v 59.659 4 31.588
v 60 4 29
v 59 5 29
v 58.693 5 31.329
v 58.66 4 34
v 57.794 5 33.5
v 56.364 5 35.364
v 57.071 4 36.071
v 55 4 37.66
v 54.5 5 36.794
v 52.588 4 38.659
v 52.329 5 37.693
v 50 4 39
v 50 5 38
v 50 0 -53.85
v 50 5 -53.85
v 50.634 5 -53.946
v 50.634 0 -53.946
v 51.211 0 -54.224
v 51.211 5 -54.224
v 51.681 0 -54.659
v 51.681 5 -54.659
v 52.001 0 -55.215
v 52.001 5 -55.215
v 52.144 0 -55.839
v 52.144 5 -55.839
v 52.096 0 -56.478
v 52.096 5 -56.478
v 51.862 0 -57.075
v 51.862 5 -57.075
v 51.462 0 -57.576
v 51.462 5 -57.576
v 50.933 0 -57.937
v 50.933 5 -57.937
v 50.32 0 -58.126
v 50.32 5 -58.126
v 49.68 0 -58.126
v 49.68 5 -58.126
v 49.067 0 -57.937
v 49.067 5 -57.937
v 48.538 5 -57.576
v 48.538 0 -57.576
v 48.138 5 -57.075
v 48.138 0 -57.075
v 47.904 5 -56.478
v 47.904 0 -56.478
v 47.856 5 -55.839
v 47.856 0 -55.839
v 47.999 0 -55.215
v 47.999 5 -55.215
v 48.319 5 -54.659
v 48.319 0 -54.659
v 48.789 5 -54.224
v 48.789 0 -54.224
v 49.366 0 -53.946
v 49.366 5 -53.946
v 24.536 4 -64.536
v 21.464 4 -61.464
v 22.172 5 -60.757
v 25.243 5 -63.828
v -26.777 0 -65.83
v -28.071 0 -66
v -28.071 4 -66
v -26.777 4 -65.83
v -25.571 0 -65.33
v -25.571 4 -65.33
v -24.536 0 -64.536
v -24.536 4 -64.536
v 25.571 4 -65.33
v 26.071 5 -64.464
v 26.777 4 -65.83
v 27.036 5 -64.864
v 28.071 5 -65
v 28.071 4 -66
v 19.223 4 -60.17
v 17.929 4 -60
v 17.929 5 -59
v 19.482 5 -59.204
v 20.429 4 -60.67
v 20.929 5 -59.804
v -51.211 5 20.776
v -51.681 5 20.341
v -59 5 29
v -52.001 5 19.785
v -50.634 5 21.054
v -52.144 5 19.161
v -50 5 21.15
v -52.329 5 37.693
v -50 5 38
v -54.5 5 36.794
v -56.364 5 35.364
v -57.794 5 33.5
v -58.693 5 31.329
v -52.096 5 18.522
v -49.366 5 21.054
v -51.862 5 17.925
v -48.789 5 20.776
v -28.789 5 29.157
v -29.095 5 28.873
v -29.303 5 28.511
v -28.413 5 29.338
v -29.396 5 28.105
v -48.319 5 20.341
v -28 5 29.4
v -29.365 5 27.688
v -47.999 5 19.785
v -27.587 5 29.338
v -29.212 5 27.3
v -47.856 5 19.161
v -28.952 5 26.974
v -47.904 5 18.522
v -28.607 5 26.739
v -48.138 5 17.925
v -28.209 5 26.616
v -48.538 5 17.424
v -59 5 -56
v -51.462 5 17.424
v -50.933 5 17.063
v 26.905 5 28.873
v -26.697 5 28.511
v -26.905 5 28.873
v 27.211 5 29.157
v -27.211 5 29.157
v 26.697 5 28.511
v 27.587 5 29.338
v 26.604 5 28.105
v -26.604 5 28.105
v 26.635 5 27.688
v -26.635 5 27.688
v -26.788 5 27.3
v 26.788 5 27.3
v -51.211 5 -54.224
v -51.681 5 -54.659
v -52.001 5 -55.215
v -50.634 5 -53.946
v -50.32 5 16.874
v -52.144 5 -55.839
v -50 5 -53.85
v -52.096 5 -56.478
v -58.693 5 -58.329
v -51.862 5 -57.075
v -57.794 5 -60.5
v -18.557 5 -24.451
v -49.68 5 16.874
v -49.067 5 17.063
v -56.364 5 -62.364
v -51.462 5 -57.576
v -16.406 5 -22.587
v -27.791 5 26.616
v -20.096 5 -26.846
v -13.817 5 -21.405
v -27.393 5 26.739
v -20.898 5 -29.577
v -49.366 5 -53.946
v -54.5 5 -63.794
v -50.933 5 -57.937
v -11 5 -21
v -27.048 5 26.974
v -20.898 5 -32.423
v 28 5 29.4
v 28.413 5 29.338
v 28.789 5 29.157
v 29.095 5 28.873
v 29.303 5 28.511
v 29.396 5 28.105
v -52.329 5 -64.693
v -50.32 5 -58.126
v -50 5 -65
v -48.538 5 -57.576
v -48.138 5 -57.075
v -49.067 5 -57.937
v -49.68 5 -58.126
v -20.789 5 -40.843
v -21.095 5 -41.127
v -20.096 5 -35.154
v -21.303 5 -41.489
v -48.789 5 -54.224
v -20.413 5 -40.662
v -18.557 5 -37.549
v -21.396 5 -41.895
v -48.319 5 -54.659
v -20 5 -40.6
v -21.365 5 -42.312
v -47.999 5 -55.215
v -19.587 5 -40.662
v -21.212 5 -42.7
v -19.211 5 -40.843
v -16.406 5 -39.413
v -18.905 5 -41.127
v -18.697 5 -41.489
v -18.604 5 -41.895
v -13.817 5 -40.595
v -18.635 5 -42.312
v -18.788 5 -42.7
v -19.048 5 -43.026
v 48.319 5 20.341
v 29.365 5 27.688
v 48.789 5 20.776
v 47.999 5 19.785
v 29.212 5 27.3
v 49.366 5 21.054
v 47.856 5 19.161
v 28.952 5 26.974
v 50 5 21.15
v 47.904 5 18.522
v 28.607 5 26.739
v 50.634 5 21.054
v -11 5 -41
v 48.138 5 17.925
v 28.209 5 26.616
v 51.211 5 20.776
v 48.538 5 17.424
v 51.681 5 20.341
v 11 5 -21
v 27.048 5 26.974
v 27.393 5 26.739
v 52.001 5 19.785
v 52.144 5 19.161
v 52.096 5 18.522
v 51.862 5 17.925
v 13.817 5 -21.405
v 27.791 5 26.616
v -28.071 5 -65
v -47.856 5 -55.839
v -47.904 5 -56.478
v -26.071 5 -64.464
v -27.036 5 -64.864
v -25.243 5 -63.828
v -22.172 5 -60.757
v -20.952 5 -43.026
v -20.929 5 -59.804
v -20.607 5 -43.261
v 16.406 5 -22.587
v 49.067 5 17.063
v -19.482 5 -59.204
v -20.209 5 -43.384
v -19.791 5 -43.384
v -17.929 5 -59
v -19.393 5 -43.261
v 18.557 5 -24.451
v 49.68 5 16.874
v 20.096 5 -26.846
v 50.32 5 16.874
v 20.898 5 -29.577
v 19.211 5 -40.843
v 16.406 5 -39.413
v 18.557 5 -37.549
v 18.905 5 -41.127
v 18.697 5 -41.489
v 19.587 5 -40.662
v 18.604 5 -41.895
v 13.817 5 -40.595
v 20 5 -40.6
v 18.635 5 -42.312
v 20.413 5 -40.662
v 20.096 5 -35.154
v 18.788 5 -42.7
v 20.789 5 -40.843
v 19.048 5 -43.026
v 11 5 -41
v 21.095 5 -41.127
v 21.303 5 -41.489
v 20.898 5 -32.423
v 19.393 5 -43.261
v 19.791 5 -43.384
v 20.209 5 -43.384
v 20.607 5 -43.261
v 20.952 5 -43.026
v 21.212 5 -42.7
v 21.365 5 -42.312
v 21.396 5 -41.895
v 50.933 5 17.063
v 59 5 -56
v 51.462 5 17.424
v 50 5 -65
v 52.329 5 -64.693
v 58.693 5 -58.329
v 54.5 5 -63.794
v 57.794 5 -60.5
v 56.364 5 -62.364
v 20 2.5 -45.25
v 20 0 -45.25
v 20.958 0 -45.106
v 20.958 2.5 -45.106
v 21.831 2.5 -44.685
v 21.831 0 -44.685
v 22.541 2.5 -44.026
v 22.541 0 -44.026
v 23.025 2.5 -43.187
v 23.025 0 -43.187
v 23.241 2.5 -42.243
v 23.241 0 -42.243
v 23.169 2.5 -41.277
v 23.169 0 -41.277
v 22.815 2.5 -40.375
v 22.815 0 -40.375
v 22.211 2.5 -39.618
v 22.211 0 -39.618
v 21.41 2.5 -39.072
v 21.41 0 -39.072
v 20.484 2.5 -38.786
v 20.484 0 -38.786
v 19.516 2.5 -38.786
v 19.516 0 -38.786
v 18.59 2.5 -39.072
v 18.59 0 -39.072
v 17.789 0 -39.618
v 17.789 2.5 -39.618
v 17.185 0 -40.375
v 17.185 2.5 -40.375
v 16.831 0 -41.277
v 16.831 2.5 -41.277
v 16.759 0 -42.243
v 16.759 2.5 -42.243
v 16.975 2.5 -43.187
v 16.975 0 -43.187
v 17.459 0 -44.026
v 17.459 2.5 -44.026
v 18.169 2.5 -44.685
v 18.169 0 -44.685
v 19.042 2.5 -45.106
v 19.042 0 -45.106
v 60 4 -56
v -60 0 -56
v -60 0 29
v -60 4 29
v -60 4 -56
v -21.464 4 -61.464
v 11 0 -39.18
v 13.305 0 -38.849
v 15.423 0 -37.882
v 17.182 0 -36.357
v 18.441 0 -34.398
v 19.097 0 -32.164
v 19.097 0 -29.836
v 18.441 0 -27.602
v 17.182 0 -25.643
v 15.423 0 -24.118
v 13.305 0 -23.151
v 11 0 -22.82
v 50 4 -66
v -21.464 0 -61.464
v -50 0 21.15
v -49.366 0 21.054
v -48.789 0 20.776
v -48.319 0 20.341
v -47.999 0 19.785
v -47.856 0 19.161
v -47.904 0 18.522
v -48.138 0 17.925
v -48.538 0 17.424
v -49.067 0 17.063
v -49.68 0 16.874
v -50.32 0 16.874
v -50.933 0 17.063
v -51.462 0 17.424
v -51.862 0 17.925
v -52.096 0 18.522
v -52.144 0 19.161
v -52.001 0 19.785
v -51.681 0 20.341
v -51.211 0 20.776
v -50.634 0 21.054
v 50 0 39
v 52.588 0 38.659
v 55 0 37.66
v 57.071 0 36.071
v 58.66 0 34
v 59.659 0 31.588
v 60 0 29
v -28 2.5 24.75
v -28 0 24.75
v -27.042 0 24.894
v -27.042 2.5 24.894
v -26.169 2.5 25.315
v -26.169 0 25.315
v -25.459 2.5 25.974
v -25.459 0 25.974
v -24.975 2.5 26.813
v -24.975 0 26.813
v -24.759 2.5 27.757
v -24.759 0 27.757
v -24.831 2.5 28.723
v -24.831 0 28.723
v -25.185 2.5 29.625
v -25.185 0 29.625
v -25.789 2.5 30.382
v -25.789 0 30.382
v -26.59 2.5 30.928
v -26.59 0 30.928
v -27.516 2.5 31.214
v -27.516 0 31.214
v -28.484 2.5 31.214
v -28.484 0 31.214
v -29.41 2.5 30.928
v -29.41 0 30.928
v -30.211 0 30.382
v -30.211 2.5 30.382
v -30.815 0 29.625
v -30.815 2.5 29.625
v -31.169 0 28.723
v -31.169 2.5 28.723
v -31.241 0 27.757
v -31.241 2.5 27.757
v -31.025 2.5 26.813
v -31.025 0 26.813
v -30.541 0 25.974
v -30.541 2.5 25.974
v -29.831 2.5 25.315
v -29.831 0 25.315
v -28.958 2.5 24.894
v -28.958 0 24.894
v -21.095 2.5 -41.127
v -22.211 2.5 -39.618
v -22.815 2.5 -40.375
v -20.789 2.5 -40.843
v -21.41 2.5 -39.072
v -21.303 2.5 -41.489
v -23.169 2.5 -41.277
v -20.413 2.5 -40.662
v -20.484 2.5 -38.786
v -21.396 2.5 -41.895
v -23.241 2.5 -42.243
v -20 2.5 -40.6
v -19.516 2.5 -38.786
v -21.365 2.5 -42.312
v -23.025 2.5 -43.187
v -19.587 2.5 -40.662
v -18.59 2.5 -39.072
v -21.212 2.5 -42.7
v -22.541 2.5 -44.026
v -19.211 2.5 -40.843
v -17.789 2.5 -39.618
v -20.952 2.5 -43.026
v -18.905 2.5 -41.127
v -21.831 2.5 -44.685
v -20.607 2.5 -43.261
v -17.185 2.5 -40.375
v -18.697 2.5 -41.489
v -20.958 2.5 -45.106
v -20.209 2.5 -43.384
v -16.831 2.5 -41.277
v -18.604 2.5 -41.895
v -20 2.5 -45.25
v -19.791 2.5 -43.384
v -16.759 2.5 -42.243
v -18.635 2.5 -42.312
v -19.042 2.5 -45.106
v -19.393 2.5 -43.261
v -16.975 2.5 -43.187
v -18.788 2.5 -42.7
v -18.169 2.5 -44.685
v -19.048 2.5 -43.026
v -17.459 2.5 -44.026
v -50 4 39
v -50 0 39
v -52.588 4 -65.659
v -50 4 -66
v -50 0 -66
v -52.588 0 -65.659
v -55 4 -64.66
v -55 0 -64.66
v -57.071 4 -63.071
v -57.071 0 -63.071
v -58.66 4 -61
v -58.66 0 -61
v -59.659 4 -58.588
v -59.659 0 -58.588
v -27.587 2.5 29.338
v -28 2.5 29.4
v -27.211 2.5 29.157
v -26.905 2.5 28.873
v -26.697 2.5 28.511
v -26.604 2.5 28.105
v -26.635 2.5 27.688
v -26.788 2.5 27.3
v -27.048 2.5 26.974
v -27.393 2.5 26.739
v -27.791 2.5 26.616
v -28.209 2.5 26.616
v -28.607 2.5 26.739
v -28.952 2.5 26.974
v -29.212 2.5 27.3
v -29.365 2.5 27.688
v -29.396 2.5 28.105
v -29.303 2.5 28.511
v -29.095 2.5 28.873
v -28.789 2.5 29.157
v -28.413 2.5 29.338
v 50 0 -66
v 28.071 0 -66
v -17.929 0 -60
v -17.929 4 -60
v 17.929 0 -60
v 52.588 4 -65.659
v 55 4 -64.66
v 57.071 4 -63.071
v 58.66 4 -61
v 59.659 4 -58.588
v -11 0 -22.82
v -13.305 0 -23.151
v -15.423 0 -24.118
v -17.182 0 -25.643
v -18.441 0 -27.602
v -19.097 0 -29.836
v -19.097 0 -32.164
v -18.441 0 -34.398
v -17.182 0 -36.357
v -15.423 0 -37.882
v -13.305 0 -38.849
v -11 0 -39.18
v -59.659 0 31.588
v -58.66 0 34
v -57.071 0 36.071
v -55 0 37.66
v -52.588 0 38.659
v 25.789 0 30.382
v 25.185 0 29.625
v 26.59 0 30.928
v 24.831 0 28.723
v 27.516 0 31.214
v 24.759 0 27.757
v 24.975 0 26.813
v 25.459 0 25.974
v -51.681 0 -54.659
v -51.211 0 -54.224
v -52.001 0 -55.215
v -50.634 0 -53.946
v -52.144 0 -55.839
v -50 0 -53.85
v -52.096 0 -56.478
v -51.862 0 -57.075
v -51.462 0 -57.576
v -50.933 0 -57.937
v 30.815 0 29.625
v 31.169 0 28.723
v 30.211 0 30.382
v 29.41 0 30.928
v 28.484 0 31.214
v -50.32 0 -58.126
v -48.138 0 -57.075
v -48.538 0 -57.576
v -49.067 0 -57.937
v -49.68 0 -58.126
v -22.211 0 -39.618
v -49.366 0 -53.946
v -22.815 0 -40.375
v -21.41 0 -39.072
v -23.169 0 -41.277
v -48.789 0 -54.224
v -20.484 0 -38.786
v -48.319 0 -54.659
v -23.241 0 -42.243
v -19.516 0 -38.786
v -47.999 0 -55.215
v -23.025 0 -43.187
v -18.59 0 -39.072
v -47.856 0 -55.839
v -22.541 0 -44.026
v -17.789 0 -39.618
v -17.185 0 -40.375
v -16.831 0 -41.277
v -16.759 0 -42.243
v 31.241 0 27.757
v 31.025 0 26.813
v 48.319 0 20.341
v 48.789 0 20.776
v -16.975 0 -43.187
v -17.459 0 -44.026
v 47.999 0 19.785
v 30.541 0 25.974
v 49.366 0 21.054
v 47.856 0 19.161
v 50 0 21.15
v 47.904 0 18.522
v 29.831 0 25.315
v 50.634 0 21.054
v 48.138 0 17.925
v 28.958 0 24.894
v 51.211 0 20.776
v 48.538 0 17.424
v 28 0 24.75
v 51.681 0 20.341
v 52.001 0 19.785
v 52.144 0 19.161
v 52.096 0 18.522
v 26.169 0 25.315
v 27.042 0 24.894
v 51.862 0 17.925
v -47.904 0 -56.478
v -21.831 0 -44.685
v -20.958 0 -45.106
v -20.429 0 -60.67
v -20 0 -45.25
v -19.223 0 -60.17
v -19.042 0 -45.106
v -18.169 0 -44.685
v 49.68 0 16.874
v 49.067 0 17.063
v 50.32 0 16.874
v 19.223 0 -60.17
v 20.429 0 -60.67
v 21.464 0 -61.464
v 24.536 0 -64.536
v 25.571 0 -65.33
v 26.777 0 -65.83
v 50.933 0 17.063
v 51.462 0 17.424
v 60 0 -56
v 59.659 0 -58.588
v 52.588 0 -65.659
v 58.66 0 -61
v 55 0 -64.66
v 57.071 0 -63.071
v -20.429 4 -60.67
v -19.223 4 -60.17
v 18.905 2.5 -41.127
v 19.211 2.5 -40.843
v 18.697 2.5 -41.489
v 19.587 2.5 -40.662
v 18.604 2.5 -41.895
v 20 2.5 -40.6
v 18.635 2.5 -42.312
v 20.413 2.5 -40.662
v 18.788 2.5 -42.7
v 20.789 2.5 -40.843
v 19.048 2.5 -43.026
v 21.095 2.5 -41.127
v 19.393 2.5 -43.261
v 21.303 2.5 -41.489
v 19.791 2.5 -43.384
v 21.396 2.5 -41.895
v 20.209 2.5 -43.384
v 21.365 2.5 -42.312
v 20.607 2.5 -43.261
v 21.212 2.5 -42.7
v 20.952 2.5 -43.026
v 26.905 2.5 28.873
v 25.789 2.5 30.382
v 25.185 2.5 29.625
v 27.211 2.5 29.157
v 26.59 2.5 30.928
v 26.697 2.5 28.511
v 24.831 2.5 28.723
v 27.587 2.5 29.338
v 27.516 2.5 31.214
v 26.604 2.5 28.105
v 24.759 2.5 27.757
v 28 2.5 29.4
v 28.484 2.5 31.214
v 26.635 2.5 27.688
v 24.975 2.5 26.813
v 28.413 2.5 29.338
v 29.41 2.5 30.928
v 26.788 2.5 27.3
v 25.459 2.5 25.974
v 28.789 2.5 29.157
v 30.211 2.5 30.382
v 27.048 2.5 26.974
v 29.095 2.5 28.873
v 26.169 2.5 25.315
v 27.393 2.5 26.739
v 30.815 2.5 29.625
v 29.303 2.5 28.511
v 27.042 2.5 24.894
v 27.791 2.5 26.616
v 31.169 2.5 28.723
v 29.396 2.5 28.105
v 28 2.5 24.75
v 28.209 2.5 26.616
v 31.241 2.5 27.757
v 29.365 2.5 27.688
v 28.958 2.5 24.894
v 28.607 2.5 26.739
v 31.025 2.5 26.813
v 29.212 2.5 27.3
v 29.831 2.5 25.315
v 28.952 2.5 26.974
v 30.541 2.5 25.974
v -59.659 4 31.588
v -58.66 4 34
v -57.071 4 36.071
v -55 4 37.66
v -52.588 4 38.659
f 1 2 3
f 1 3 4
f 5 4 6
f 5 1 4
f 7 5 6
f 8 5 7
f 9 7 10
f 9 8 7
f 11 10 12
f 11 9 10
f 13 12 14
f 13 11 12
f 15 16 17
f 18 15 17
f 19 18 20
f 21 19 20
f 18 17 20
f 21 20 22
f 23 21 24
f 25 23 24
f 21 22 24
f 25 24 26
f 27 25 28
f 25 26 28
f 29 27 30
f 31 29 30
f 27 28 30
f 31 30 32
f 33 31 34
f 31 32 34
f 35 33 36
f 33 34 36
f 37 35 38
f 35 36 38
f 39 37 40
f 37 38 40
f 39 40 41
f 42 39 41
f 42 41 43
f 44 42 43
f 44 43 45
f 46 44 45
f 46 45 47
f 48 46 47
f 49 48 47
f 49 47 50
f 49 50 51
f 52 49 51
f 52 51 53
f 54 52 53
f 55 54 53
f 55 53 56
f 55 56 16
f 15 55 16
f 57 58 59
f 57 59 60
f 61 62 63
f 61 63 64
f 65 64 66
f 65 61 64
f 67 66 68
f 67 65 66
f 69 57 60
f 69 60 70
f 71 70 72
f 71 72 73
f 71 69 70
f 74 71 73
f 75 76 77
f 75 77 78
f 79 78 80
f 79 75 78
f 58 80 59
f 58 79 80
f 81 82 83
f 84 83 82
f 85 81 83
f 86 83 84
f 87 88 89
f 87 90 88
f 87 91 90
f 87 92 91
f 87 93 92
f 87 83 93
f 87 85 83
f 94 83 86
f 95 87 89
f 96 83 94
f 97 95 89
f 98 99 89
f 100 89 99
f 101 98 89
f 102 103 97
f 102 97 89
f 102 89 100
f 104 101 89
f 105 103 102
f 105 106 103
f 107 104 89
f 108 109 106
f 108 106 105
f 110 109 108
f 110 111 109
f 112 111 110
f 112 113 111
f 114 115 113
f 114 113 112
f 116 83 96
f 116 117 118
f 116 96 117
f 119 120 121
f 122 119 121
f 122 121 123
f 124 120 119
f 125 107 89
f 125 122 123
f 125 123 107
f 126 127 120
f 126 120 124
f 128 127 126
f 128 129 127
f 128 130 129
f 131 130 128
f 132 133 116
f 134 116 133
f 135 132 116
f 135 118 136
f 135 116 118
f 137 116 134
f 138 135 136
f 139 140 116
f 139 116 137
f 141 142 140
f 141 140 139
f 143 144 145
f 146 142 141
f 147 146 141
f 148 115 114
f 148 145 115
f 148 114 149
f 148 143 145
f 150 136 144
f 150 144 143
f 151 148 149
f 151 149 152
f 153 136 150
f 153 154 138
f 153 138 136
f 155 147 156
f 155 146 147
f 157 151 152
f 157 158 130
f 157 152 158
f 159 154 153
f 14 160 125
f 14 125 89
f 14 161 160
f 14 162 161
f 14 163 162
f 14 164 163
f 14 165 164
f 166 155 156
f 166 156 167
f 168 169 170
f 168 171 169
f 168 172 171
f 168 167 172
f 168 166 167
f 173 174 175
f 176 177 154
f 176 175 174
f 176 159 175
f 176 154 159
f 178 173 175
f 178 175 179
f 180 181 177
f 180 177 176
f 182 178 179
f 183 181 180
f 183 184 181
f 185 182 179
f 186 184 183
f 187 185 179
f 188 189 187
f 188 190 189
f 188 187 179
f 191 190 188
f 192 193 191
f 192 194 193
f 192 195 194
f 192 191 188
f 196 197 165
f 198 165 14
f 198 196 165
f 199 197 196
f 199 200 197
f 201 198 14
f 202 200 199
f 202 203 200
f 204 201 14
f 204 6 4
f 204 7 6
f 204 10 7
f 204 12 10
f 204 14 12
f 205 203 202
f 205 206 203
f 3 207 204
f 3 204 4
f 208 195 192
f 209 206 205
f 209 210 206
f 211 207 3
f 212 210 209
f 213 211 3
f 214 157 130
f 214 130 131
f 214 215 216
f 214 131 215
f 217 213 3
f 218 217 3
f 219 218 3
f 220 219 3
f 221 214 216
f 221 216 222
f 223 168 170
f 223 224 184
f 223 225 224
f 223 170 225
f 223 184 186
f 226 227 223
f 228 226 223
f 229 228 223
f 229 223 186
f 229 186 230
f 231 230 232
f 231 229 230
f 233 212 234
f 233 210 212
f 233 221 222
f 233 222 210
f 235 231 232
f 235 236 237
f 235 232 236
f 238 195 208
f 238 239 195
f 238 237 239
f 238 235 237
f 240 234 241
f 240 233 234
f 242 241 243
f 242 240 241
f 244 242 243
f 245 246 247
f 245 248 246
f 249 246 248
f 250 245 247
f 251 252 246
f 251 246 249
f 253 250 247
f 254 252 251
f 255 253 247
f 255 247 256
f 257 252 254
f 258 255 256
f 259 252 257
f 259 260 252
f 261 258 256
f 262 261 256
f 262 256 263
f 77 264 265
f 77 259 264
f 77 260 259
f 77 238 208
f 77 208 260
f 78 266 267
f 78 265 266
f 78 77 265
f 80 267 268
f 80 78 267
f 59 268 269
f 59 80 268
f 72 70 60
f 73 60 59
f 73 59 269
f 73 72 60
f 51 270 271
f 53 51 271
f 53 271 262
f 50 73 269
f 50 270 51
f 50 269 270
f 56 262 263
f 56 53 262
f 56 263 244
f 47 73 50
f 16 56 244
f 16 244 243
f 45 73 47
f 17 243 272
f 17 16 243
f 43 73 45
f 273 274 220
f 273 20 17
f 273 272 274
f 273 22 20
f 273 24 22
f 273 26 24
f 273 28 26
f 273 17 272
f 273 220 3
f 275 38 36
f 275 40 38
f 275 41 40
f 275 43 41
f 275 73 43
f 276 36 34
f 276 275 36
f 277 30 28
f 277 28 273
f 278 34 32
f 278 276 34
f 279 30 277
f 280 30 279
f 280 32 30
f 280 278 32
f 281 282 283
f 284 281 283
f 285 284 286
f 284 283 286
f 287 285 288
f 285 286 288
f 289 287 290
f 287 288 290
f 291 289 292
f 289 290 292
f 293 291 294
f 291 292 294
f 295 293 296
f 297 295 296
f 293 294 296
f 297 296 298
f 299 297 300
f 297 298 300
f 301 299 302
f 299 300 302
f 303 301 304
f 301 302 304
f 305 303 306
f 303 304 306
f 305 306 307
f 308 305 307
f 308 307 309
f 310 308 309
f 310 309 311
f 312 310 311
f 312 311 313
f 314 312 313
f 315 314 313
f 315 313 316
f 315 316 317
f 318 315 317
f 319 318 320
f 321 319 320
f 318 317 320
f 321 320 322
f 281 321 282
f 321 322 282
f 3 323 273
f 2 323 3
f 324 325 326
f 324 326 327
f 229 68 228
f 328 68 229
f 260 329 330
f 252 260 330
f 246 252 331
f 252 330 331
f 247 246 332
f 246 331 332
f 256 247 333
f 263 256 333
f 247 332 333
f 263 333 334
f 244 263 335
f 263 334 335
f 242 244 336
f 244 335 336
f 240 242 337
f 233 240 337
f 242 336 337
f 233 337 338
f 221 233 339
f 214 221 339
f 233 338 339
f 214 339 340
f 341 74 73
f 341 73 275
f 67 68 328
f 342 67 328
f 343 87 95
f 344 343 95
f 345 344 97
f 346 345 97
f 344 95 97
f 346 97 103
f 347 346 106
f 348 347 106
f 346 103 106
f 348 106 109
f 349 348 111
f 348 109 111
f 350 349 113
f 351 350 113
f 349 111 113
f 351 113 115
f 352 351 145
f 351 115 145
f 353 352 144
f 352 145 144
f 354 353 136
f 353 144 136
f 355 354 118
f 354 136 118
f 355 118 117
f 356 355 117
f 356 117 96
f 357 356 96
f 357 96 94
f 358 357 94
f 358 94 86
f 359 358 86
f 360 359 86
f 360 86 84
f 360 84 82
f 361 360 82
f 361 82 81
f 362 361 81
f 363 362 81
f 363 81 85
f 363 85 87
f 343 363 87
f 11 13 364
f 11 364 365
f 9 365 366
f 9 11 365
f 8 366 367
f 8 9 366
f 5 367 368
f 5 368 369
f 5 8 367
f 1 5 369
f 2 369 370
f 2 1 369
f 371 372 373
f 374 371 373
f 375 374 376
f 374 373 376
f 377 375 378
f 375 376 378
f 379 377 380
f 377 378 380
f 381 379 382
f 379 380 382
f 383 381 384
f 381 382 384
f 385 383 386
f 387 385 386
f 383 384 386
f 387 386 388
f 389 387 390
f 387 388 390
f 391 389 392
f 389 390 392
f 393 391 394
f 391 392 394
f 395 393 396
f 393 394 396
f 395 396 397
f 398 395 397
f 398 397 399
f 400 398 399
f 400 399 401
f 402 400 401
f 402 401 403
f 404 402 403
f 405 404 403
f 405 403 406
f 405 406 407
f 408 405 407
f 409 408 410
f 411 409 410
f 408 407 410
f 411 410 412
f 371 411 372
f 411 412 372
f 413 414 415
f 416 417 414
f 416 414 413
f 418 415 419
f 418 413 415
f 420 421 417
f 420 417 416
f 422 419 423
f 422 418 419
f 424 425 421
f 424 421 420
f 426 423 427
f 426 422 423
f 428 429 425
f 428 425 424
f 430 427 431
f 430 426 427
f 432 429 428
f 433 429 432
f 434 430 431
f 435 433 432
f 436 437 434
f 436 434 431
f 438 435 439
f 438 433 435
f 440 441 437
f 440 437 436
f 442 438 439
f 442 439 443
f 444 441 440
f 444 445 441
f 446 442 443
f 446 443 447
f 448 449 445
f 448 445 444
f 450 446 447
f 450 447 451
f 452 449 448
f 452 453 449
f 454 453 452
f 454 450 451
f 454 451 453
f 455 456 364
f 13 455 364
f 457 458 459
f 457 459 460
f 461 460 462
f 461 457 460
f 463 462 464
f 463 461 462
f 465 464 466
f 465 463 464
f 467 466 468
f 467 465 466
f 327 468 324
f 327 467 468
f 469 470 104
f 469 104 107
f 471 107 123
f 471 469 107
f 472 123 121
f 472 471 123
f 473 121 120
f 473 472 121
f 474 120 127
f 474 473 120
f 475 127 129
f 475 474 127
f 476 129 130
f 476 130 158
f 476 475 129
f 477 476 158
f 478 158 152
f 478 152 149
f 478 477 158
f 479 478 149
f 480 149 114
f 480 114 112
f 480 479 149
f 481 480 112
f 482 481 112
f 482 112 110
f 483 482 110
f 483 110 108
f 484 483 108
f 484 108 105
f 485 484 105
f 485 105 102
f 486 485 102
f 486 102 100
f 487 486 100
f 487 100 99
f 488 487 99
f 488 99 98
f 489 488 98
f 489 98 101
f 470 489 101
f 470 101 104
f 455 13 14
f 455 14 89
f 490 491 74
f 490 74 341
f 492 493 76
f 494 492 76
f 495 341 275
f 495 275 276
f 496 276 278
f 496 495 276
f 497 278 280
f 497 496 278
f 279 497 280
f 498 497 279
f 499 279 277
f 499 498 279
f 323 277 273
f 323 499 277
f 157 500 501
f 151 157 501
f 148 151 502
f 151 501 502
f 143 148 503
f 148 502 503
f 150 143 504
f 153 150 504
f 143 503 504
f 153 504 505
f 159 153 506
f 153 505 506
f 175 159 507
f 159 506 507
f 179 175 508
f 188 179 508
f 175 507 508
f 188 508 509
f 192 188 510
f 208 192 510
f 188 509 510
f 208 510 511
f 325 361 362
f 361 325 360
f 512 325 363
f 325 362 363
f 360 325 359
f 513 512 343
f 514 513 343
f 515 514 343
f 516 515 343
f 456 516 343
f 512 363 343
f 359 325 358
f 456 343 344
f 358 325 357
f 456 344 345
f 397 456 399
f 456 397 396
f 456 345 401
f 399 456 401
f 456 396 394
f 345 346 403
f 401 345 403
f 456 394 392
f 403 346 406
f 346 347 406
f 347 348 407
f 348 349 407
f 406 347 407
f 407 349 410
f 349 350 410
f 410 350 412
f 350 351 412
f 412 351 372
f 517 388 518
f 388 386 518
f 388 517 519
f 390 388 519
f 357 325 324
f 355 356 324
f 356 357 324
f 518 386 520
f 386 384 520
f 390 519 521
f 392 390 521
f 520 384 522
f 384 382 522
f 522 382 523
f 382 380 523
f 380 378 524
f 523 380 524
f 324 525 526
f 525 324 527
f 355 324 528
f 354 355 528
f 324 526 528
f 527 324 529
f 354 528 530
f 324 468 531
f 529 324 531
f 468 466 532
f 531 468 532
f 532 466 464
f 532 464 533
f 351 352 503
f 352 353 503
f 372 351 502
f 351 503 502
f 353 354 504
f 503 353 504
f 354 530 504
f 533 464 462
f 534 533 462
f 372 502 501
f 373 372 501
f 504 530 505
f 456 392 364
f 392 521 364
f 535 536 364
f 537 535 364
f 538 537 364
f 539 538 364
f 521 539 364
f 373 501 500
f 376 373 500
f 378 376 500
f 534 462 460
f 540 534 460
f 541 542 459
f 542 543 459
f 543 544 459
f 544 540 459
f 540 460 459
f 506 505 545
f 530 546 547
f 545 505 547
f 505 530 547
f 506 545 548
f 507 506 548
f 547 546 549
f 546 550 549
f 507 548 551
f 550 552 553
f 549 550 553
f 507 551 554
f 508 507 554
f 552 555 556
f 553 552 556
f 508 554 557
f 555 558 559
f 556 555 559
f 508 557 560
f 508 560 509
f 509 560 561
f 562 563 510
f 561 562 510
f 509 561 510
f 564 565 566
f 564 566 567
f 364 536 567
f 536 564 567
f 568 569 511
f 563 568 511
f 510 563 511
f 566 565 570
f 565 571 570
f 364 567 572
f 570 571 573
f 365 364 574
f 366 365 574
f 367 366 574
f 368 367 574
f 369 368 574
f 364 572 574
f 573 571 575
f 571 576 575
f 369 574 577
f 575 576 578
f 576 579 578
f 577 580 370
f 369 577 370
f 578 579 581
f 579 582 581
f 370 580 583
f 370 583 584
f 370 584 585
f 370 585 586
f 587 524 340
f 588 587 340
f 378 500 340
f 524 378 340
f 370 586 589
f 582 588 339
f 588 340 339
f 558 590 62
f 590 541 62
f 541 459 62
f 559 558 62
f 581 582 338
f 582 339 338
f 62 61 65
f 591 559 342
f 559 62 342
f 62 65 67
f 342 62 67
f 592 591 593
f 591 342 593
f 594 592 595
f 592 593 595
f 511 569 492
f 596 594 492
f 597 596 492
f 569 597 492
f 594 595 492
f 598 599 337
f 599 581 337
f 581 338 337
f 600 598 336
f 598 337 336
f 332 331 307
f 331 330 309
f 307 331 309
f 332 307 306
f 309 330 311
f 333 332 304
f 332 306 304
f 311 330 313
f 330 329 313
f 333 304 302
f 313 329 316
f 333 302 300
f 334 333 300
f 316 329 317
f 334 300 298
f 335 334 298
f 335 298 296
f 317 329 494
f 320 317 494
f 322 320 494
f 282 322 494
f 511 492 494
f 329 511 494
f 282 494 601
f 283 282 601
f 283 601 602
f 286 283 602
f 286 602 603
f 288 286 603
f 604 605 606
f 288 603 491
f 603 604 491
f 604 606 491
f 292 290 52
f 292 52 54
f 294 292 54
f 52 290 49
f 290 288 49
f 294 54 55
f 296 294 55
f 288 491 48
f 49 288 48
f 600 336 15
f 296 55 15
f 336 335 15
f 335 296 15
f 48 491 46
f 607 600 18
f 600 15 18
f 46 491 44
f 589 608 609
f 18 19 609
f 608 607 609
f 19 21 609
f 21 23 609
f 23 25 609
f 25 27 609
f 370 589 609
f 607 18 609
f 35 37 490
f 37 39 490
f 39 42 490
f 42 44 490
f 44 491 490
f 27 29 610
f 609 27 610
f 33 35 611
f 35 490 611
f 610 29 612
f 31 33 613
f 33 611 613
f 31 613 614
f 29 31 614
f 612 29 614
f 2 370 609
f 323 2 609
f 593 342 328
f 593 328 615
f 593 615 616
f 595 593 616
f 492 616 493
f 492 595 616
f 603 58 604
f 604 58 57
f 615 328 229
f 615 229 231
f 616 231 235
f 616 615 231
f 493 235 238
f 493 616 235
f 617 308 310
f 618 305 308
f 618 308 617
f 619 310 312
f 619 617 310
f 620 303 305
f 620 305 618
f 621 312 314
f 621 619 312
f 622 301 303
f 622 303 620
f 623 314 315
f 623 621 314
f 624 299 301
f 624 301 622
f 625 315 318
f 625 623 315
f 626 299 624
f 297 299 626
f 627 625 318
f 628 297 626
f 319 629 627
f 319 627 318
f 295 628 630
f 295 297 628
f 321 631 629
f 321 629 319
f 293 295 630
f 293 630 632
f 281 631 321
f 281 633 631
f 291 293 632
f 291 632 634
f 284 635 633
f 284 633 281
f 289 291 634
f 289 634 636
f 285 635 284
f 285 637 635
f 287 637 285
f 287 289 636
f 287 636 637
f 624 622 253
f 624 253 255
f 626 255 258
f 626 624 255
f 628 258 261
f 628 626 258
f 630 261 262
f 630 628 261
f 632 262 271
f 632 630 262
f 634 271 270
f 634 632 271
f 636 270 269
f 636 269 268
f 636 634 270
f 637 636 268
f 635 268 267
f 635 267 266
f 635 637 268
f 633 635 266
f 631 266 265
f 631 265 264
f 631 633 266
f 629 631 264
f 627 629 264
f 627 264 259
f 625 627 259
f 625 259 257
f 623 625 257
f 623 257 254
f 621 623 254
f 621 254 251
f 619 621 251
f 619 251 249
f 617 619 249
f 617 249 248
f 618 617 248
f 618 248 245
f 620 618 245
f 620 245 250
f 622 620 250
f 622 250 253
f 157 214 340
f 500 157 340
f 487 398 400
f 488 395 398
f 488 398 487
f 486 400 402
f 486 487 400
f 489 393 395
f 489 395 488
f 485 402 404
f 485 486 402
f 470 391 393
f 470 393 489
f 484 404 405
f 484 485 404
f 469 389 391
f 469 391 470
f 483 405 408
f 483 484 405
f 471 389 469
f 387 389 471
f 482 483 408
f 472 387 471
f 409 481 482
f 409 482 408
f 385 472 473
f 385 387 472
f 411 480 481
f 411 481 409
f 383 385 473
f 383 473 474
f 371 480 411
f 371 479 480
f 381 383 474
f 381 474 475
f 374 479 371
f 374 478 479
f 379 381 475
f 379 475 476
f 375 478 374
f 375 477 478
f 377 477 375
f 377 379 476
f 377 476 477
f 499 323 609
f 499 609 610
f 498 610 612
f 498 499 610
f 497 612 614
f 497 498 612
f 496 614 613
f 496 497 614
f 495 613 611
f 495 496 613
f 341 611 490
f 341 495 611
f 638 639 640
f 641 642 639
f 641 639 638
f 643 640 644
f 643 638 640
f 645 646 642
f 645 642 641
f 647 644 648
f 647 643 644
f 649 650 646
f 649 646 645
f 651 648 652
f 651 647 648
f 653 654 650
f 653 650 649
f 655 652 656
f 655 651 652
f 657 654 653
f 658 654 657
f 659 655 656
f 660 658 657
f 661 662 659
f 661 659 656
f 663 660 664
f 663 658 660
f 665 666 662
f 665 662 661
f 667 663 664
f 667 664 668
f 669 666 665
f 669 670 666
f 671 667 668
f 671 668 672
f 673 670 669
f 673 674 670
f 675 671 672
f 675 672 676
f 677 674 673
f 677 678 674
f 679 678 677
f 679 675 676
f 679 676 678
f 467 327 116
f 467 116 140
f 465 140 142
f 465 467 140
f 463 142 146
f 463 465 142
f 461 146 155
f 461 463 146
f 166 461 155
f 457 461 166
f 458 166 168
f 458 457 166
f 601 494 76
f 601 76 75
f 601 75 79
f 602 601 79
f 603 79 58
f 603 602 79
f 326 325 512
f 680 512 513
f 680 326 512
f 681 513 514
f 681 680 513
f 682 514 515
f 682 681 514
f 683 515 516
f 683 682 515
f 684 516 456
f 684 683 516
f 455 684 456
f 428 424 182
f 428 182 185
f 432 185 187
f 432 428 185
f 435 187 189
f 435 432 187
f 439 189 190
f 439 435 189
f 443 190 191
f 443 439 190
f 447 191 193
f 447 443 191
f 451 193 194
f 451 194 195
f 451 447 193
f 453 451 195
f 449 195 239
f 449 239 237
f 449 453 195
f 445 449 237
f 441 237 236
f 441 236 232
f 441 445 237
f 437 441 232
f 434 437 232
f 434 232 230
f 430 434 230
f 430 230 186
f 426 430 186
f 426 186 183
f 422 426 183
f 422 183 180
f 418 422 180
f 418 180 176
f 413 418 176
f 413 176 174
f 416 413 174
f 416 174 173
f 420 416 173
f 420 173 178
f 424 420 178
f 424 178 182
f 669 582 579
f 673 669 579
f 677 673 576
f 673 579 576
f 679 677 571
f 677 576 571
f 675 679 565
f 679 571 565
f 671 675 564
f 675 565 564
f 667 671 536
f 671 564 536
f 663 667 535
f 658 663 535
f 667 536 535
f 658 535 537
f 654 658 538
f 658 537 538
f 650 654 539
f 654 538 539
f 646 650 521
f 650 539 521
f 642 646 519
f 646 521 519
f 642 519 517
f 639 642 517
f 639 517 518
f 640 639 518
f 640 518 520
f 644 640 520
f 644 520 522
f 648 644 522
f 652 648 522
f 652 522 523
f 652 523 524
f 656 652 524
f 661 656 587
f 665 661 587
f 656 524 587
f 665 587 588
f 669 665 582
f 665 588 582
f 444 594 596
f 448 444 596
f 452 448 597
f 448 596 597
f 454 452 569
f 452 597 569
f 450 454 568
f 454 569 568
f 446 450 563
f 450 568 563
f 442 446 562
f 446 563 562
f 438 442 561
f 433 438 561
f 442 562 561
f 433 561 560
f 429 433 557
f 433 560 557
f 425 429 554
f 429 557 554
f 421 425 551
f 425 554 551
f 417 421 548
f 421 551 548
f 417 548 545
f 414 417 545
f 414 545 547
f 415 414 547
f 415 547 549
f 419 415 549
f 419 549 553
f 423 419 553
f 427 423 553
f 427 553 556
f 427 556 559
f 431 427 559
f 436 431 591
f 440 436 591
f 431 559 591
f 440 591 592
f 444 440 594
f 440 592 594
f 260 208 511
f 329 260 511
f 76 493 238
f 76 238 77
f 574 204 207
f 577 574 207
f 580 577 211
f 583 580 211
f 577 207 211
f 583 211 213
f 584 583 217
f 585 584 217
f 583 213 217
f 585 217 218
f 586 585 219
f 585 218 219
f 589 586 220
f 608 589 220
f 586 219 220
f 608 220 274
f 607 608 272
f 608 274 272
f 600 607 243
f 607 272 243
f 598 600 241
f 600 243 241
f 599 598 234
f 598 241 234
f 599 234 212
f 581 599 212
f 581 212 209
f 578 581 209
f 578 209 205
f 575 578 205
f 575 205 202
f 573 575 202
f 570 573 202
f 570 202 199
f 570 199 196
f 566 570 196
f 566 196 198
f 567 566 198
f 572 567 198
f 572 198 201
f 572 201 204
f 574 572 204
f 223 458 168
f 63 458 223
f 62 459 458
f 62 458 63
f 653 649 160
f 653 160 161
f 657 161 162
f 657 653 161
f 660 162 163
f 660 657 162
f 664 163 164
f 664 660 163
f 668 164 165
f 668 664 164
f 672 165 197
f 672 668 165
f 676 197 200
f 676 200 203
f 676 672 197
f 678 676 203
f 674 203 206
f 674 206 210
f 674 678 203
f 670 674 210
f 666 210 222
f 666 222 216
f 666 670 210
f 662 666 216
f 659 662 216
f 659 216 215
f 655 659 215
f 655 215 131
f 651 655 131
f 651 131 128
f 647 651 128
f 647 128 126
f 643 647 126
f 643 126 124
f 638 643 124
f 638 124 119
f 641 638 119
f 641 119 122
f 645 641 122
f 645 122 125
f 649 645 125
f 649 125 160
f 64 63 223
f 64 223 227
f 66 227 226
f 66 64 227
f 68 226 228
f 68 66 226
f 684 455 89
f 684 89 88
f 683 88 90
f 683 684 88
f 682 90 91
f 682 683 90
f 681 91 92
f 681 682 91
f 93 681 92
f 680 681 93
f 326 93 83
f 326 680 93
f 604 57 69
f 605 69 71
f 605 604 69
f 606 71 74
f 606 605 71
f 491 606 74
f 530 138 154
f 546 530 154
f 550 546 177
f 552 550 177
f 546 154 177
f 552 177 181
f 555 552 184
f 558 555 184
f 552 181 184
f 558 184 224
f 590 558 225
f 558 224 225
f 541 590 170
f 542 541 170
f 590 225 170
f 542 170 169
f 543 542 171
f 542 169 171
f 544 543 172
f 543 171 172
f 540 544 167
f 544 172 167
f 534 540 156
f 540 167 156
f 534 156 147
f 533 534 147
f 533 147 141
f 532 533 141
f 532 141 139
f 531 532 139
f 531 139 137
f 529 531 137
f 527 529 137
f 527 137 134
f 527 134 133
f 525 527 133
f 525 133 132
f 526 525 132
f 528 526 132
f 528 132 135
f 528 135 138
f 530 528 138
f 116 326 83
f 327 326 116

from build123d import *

# Parameters (mm, degrees)
SKETCH2_W           = 120
SKETCH2_H           = 105
SKETCH2_R           = 1.4
BOSS_EXTRUDE2_DEPTH = 5
CUT_EXTRUDE13_DEPTH = 90.336442732
FILLET6_R           = 5
FILLET5_R           = 10
CHAMFER4_SIZE       = 1
SKETCH11_R          = 2.15
CUT_EXTRUDE10_DEPTH = 90.336442732
SKETCH13_R          = 3.25
CUT_EXTRUDE12_DEPTH = 2.5
CUT_EXTRUDE14_DEPTH = 90.336442732
CHAMFER5_SIZE       = 3
CHAMFER5_SIZE_2     = 8.242432258


with BuildPart() as part:
    # Sketch2 → Boss-Extrude2 (new body)
    with BuildSketch(Plane(origin=(0, 0, 0), x_dir=(1, 0, 0), z_dir=(0, 1, 0))):
        with Locations((0, 13.5)):
            Rectangle(SKETCH2_W, SKETCH2_H)
        with Locations(Location((-28, -28, 0), (0, 0, 270))):
            Circle(SKETCH2_R, mode=Mode.SUBTRACT)
        with Locations(Location((28, -28, 0), (0, 0, 270))):
            Circle(SKETCH2_R, mode=Mode.SUBTRACT)
        with Locations(Location((20, 42, 0), (0, 0, 270))):
            Circle(SKETCH2_R, mode=Mode.SUBTRACT)
        with Locations(Location((-20, 42, 0), (0, 0, 270))):
            Circle(SKETCH2_R, mode=Mode.SUBTRACT)
    extrude(amount=BOSS_EXTRUDE2_DEPTH)

    # Sketch9 → Cut-Extrude13 (cut, through all)
    with BuildSketch(Plane(origin=(0, 5, 0), x_dir=(1, 0, 0), z_dir=(0, 1, 0))):
        Polygon((-26, 66), (-20, 60), (20, 60), (26, 66), align=None)
    extrude(amount=-CUT_EXTRUDE13_DEPTH, mode=Mode.SUBTRACT)

    # Fillet6
    fillet6_edges = [part.edges().sort_by_distance(p)[0] for p in [
        (-26, 2.5, -66),
        (26, 2.5, -66),
        (20, 2.5, -60),
        (-20, 2.5, -60),
    ]]
    fillet(fillet6_edges, radius=FILLET6_R)

    # Fillet5
    fillet5_edges = [part.edges().sort_by_distance(p)[0] for p in [
        (-60, 2.5, -66),
        (60, 2.5, -66),
        (60, 2.5, 39),
        (-60, 2.5, 39),
    ]]
    fillet(fillet5_edges, radius=FILLET5_R)

    # Chamfer4
    chamfer4_edges = [part.edges().sort_by_distance(p)[0] for p in [
        (23, 5, -63),
        (0, 5, -60),
        (-23, 5, -63),
        (-39.035533906, 5, -66),
        (-26.15765065, 5, -65.619397663),
        (26.15765065, 5, -65.619397663),
        (19.84234935, 5, -60.380602337),
        (-19.84234935, 5, -60.380602337),
        (-60, 5, -13.5),
        (39.035533906, 5, -66),
        (0, 5, 39),
        (60, 5, -13.5),
        (-57.071067812, 5, 36.071067812),
        (57.071067812, 5, 36.071067812),
        (57.071067812, 5, -63.071067812),
        (-57.071067812, 5, -63.071067812),
    ]]
    chamfer(chamfer4_edges, length=CHAMFER4_SIZE)

    # Sketch11 → Cut-Extrude10 (cut, through all)
    with BuildSketch(Plane(origin=(0, 5, 0), x_dir=(1, 0, 0), z_dir=(0, 1, 0))):
        with Locations(Location((-50, 56, 0), (0, 0, 270))):
            Circle(SKETCH11_R)
        with Locations(Location((50, 56, 0), (0, 0, 270))):
            Circle(SKETCH11_R)
        with Locations(Location((-50, -19, 0), (0, 0, 270))):
            Circle(SKETCH11_R)
        with Locations(Location((50, -19, 0), (0, 0, 270))):
            Circle(SKETCH11_R)
    extrude(amount=-CUT_EXTRUDE10_DEPTH, mode=Mode.SUBTRACT)

    # Sketch13 → Cut-Extrude12 (cut)
    with BuildSketch(Plane.XZ):
        with Locations(Location((-28, 28, 0), (0, 0, 270))):
            Circle(SKETCH13_R)
        with Locations(Location((28, 28, 0), (0, 0, 270))):
            Circle(SKETCH13_R)
        with Locations(Location((-20, -42, 0), (0, 0, 270))):
            Circle(SKETCH13_R)
        with Locations(Location((20, -42, 0), (0, 0, 270))):
            Circle(SKETCH13_R)
    extrude(amount=-CUT_EXTRUDE12_DEPTH, mode=Mode.SUBTRACT)

    # Sketch14 → Cut-Extrude14 (cut, through all)
    with BuildSketch(Plane(origin=(0, 5, 0), x_dir=(1, 0, 0), z_dir=(0, 1, 0))):
        with BuildLine():
            Line((-11, 38), (11, 38))
            ThreePointArc((11, 38), (18, 31), (11, 24))
            Line((11, 24), (-11, 24))
            ThreePointArc((-11, 24), (-18, 31), (-11, 38))
        make_face()
    extrude(amount=-CUT_EXTRUDE14_DEPTH, mode=Mode.SUBTRACT)

    # Chamfer5
    # the kernel refuses this chamfer: 8.242432258, 3 mm, written as the material it takes off along each edge
    with BuildSketch(Plane(origin=(11, 5, -24), x_dir=(0, 0.09904090225205062, 0.9950833631817486), z_dir=(-1, 0, 0)), Plane(origin=(-11, 5, -38), x_dir=(0, 0.09904090225205073, -0.9950833631817486), z_dir=(1, 0, 0))) as chamfer5_piece_1:
        Polygon((CHAMFER5_SIZE * 0.995083363182, -CHAMFER5_SIZE * 0.0990409022521), (-CHAMFER5_SIZE_2 * 0.0990409022564, -CHAMFER5_SIZE_2 * 0.995083363226), (0, 0), align=None)
    extrude(amount=22, mode=Mode.SUBTRACT)
    with BuildSketch(Plane(origin=(11, 5, -31), x_dir=(0, 0, -1), z_dir=(-1, 0, 0))) as chamfer5_piece_2:
        Polygon((7 + CHAMFER5_SIZE, 0), (7, CHAMFER5_SIZE_2), (7, 0), align=None)
    revolve(axis=Axis((11, 5, -31), (0, -1, 0)), revolution_arc=180, mode=Mode.SUBTRACT)
    with BuildSketch(Plane(origin=(-11, 5, -31), x_dir=(0, 0, 1), z_dir=(1, 0, 0))) as chamfer5_piece_3:
        Polygon((7 + CHAMFER5_SIZE, 0), (7, CHAMFER5_SIZE_2), (7, 0), align=None)
    revolve(axis=Axis((-11, 5, -31), (0, -1, 0)), revolution_arc=180, mode=Mode.SUBTRACT)


solid = part.part
